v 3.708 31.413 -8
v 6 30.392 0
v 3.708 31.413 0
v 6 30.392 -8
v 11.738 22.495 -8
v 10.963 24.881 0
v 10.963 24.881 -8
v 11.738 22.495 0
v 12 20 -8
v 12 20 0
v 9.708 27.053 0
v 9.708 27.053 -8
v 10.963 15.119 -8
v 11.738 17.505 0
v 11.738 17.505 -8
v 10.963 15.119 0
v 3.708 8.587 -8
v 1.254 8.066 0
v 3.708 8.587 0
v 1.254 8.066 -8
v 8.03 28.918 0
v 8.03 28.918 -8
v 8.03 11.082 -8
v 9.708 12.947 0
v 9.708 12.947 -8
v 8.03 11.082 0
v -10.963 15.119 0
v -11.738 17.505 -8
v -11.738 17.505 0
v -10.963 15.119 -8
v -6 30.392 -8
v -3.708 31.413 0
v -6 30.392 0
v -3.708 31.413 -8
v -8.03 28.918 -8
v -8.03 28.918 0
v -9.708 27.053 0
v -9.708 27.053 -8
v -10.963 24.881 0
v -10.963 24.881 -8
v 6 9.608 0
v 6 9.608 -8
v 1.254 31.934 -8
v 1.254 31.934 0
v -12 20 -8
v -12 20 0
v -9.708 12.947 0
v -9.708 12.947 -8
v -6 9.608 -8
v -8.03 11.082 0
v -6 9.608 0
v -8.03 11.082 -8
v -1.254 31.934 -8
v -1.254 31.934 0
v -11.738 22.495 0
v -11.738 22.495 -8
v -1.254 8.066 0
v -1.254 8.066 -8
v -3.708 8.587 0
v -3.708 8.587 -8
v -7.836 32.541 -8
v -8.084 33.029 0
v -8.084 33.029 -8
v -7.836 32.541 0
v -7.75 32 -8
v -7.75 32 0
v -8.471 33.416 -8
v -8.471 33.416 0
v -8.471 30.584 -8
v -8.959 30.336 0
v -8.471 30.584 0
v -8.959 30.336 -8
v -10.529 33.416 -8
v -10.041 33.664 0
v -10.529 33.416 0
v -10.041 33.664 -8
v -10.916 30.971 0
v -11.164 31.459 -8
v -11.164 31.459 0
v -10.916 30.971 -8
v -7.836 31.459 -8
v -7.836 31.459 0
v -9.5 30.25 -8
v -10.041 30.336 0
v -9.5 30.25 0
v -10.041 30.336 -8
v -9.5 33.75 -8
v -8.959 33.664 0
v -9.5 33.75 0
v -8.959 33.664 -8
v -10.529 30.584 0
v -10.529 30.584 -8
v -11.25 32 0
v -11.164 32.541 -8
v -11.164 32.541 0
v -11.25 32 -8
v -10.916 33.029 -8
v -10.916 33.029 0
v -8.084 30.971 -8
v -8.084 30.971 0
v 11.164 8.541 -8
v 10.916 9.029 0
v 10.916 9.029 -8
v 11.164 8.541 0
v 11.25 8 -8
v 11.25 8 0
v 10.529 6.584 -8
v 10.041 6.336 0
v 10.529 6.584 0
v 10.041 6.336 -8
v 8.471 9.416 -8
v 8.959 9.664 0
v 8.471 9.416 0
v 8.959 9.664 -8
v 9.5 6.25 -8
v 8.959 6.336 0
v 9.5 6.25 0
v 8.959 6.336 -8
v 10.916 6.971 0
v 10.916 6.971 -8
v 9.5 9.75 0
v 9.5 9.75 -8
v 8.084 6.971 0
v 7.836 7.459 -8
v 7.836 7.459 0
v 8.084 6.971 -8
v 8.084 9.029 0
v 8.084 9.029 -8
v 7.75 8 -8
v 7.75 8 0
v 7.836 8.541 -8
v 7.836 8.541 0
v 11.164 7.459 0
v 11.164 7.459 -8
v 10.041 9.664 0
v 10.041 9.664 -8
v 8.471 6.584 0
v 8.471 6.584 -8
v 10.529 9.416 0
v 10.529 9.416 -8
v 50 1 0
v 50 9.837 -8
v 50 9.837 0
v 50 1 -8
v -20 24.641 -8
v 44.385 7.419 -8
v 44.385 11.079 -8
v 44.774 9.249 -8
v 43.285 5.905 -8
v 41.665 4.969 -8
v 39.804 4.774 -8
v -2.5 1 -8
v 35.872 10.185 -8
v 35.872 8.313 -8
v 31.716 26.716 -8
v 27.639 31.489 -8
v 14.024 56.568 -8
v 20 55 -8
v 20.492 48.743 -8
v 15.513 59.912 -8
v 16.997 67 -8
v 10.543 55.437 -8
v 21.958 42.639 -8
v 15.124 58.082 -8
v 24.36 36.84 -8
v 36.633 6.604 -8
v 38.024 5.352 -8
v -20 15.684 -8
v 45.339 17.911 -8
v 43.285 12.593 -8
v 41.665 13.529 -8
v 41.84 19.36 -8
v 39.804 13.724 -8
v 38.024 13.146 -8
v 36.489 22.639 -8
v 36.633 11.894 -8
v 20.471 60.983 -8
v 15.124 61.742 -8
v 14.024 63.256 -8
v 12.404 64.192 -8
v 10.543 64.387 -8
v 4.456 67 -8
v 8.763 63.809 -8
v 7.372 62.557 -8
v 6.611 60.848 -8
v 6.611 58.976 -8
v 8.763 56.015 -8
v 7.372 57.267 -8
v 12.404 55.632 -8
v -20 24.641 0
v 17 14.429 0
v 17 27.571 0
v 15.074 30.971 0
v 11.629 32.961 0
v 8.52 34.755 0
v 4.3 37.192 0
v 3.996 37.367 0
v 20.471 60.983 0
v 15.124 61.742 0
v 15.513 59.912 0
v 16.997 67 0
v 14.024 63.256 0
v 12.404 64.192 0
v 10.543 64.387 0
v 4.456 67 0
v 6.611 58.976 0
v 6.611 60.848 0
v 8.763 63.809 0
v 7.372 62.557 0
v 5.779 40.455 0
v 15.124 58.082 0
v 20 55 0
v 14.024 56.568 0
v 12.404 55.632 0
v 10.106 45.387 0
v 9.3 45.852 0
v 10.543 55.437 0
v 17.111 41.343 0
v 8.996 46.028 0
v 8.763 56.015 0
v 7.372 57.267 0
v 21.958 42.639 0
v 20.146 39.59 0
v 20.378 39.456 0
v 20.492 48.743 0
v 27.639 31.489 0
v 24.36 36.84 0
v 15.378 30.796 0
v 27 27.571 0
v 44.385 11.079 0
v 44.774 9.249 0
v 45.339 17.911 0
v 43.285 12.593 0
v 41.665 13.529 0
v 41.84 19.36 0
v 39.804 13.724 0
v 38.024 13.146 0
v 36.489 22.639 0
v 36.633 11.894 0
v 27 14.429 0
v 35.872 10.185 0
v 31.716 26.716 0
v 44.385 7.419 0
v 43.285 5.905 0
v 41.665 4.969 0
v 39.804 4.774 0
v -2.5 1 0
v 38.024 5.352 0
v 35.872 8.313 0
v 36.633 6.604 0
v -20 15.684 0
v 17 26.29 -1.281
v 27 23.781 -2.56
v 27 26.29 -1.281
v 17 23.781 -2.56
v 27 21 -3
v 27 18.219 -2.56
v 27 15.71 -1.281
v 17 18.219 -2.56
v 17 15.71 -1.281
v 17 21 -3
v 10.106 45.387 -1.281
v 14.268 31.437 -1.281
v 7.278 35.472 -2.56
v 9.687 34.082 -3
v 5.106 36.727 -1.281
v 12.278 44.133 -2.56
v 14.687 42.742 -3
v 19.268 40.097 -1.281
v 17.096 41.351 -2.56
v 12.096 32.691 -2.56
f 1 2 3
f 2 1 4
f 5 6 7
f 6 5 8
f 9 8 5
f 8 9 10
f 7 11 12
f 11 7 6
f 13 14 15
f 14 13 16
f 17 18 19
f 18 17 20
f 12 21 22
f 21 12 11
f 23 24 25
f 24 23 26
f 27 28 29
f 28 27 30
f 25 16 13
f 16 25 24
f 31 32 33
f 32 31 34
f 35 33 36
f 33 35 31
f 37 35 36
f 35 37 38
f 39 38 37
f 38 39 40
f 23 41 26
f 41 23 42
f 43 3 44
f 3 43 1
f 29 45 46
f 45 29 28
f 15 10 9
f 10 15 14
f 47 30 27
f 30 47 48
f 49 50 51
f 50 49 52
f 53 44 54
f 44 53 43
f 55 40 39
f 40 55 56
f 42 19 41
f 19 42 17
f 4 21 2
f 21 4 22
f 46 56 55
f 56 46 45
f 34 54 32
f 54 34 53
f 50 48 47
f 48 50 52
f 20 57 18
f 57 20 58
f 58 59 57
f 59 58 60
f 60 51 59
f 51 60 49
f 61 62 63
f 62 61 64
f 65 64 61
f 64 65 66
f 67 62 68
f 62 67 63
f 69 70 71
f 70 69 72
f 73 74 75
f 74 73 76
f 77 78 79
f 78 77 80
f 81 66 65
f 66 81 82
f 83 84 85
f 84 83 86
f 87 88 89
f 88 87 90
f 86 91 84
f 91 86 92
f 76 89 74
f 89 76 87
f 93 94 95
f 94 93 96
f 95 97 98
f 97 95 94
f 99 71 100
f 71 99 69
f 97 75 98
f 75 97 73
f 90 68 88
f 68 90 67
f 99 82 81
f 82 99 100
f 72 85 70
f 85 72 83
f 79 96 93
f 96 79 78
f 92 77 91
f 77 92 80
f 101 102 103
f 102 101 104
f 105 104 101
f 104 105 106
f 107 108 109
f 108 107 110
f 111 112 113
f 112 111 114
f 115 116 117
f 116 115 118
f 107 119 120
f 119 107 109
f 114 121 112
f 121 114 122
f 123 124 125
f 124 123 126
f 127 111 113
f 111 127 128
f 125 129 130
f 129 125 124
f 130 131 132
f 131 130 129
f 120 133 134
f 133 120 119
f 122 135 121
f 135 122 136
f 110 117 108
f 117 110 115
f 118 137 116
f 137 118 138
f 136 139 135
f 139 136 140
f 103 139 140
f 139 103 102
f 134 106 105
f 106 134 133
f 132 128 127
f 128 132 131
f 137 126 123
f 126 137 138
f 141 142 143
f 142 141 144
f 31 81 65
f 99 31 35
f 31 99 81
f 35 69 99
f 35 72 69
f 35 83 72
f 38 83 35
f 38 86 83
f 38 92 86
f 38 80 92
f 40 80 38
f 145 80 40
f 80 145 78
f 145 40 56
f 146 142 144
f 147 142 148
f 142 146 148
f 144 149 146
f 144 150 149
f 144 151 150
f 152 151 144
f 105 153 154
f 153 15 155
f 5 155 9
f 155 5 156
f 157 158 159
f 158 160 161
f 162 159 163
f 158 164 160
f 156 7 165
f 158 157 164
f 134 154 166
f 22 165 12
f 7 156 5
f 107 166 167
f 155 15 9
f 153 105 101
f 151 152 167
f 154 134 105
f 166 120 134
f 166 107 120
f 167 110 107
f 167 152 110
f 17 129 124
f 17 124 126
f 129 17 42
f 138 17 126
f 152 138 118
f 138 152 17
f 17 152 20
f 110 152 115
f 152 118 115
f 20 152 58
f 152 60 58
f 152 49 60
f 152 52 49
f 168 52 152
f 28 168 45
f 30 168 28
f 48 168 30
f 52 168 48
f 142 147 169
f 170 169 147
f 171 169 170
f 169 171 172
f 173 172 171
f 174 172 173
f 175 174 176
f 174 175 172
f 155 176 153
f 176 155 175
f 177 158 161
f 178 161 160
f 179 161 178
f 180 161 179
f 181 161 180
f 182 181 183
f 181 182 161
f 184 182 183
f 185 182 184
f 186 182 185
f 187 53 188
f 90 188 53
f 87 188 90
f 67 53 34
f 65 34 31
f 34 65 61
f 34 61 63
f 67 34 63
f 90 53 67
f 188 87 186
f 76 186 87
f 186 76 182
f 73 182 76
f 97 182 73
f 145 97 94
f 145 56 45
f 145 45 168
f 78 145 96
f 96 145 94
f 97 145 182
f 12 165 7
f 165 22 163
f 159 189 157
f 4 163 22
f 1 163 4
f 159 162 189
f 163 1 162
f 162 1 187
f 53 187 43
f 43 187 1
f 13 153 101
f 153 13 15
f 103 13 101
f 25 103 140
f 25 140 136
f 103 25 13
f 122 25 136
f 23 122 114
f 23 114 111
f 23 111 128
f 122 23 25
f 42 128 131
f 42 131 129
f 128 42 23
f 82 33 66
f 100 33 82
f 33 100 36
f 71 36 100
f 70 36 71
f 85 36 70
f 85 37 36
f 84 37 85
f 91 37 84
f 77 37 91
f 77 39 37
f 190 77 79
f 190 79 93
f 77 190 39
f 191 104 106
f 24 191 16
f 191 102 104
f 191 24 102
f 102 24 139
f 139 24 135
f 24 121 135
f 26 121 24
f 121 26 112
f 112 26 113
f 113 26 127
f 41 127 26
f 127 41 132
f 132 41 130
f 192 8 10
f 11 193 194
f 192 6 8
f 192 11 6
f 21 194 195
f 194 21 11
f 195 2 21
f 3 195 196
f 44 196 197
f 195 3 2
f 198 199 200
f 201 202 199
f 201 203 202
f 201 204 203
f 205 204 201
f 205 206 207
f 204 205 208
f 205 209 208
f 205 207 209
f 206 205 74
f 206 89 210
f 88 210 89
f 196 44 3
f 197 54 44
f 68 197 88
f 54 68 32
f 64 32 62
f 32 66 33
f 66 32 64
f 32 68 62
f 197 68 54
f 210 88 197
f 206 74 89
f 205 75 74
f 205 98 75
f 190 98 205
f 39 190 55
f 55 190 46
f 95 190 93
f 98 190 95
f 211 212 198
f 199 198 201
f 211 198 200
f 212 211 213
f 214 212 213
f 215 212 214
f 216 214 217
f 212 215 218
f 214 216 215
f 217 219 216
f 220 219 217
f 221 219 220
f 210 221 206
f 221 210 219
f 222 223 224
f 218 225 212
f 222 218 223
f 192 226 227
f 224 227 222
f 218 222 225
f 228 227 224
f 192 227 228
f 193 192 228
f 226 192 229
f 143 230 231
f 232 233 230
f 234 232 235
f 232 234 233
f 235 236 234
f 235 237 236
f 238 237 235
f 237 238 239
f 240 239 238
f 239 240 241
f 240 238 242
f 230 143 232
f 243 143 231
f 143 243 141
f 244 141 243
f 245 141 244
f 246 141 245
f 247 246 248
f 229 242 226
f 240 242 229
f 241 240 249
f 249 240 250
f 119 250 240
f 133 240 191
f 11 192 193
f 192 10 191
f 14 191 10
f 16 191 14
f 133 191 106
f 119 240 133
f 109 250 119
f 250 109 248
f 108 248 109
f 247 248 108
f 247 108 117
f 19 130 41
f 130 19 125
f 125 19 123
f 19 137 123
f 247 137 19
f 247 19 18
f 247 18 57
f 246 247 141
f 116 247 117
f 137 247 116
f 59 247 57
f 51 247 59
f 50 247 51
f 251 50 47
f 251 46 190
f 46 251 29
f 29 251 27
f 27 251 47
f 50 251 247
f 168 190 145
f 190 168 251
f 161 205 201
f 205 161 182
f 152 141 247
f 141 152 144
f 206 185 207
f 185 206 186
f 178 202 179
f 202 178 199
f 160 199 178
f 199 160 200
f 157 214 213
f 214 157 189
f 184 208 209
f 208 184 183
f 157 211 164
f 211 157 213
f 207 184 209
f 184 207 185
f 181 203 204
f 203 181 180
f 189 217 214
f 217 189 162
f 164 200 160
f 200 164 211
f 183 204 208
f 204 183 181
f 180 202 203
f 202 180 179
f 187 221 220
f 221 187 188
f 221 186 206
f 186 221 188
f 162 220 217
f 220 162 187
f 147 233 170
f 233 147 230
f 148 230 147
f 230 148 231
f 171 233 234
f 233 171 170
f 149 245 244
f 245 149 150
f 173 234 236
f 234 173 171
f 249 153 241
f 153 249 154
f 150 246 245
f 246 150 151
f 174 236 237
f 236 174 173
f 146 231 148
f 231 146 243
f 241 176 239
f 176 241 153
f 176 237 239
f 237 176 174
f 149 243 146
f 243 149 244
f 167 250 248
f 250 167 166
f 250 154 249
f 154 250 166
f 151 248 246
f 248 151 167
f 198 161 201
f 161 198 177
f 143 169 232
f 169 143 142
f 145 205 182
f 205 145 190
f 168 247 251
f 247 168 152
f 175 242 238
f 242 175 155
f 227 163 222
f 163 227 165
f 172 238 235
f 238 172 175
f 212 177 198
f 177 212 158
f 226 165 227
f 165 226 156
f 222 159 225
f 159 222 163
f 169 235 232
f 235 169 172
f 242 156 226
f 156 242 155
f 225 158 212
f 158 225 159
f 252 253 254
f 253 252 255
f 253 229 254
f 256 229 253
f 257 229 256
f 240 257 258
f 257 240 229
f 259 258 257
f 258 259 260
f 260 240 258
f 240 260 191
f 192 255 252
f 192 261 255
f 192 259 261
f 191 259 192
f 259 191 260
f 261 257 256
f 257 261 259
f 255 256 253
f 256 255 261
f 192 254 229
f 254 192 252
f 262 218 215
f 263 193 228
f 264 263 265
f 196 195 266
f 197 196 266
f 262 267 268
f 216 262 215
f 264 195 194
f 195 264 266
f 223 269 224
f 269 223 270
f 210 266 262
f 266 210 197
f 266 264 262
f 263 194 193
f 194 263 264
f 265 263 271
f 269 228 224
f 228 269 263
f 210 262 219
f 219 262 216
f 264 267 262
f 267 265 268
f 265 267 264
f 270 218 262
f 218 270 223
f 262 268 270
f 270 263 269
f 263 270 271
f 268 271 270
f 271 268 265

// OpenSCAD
// file: endstop-holder.scad
// PRUSA Mendel  
// Endstop holder
// Used to attach endstops to 8mm rods
// GNU GPL v2
// Josef Průša
// josefprusa@me.com
// prusadjs.cz
// http://www.reprap.org/wiki/Prusa_Mendel
// http://github.com/prusajr/PrusaMendel

// Modified by Adrian to include support for sub-min microswitches. 15 May 2011

include <../configuration.scad>

/**
 *@name Endstop holder
 *@using 1 m3x20
 *@using 1 m3nut
 *@using 2 m3washer
 */
module endstop(){
outer_diameter = m8_diameter/2+3.3;
screw_hole_spacing = 9.5; // Set to 20 to get standard design
opening_size = m8_diameter-1.5; //openingsize
switch_screw_hole_radius = 1.3; // Set to m3_diameter/2 to get standard design
pcb_mount=true; // Set false for endstop
translate([-outer_diameter, -outer_diameter, -5]) 
difference(){

	union(){


		translate([outer_diameter, outer_diameter, 0]) cylinder(h =10, r = outer_diameter, $fn = 20);
		translate([outer_diameter, 0, 0]) cube([15.5,outer_diameter*2,10]);
		if(!pcb_mount)
			translate([-42,0, 0]) cube([50, 4, 10]);
	}

	// Chop the end just after the hole

	translate([-(56+screw_hole_spacing+ switch_screw_hole_radius), -10, -10]) 
		cube([50, 50, 50]);

	translate([9, outer_diameter-opening_size/2, 0]) cube([18,opening_size,20]);
	translate([outer_diameter, outer_diameter, 0]) cylinder(h =20, r = m8_diameter/2, $fn = 18);
	translate([17, 17, 5]) rotate([90, 0, 0]) cylinder(h =20, r = m3_diameter/2, $fn = 10);
	translate([-4, 17, 5]) rotate([90, 0, 0]) cylinder(h =20, r = switch_screw_hole_radius, $fn = 10);
	translate([-(4+screw_hole_spacing), 17, 5]) rotate([90, 0, 0]) cylinder(h =20, r = switch_screw_hole_radius, $fn = 10);
}
}
//endstop();
// file: ../configuration.scad
// PRUSA Mendel  
// Configuration file
// GNU GPL v2
// Josef Pra
// josefprusa@me.com
// prusadjs.cz
// http://www.reprap.org/wiki/Prusa_Mendel
// http://github.com/prusajr/PrusaMendel


// PLEASE SELECT ONE OF THE CONFIGURATIONS BELOW
// BY UN-COMMENTING IT


variant=0; //0 for metric
//variant=1; //1 for SAE
if(variant==0){
echo("variant: metric");
}else if(variant==1){
echo("variant: sae");
} else{
echo("WARNING: INVALID CONFIGURATION");
}




vars=[
//[m8_dia, m8_nut, m4_dia, m4_nut, m3_dia, m3_nut, bush_dia, mot_shaft, bush_rod, bush_outerdia, bush_length]
[9,16.4,5,9,4.4,7,11,5.3,8,16,11],//metric
[9,15.7,5.5,10.6,5.5,10.6,11.5,5.3,7.9375,16,11]//SAE
];


//BUSHING TYPE Can generate three versions
// 1 - regular old ones
// 2 - helical ones
// 3 - holders for brass or any other bought bushings
bushing_type = 2;


//Round corner diameter
round_corner_diameter = 8;


//Thin wall size
layer_height = 0.4;
perimeter_width_over_thicknes = 1.6;
infill_widht_over_thickness = 1.55;
thin_wall = 2*(perimeter_width_over_thicknes*layer_height+infill_widht_over_thickness*layer_height);
if(thin_wall<2){
	echo("Check thin wall size, its below 2mm!");
}
echo(thin_wall);


//DO NOT TOUCH THIS SECTION!
m8_diameter = vars[variant][0];
m8_nut_diameter = vars[variant][1];
m4_diameter = vars[variant][2];
m4_nut_diameter = vars[variant][3];
m3_diameter = vars[variant][4];
m3_nut_diameter = vars[variant][5];
bushing_diameter = vars[variant][6];
motor_shaft=vars[variant][7];
bushing_rodsize = vars[variant][8];
bushing_outerDiameter = vars[variant][9];
bushing_lenght = vars[variant][10];




// MINI-HUXLEY VERSION (TODO, just place holder)
// include <configuration-huxley.scad>


// MEGA VERSION (TODO, just place holder)
// include <configuration-mega.scad>




// Some basic functions, probably should be somewhere else
module roundcorner(diameter){
	difference(){
		cube(size = [diameter,diameter,99], center = false);
		translate(v = [diameter, diameter, 0]) cylinder(h = 100, r=diameter, center=true);
	}
}
// main file
include <../configuration.scad>
include <endstop-holder.scad>
outer_diameter = m8_diameter/2+3.3;

//dxf_linear_extrude(file = "../vertex-body-fixed-qcad.dxf",height=1,center=true);


module xlr_bracket()
{
	mirror([0,0,1])// comment out to mount on the other side
	difference()
	{
		translate([-20, 1, 0])
			cube([70,66,8]);
		
		translate([11.013,59.912]) cylinder(h=30,r=(m8_diameter/2),center=true); 
		translate([40.274,9.249,0]) cylinder(h=30,r=(m8_diameter/2),center=true); 
		
		translate([0, 20, 0])
		{
			cylinder(h=30,r=12,center=true,$fn=30);
			translate([-9.5,12,0])
				cylinder(h=30,r=1.75,center=true,$fn=20);
			translate([9.5,-12,0])
				cylinder(h=30,r=1.75,center=true,$fn=20);
		}
		
		
		
		translate([73, 70, 0])
			rotate([0,0,-60])
				cube([100,100,30], center=true);
		
		translate([-40, 90, 0])
			rotate([0,0,60])
				cube([100,100,30], center=true);
		
		translate([-35, -37, 0])
			rotate([0,0,-40])
				cube([100,100,30], center=true);
		
		translate([60, 55, 0])
			cylinder(r=40,h=30, center=true,$fn=40);
		
		
		translate([22,21,-6])
			rotate([0,90,0])
				cylinder(h=10,r=9,center=true,$fn=20);
		translate([13.687,41.010,-6]) rotate(a=60,v=[0,0,1])
			rotate([0,90,0])
				translate([0,0,-3])
					cylinder(h=10,r=9,center=true,$fn=20);		
	}
}


xlr_bracket();
